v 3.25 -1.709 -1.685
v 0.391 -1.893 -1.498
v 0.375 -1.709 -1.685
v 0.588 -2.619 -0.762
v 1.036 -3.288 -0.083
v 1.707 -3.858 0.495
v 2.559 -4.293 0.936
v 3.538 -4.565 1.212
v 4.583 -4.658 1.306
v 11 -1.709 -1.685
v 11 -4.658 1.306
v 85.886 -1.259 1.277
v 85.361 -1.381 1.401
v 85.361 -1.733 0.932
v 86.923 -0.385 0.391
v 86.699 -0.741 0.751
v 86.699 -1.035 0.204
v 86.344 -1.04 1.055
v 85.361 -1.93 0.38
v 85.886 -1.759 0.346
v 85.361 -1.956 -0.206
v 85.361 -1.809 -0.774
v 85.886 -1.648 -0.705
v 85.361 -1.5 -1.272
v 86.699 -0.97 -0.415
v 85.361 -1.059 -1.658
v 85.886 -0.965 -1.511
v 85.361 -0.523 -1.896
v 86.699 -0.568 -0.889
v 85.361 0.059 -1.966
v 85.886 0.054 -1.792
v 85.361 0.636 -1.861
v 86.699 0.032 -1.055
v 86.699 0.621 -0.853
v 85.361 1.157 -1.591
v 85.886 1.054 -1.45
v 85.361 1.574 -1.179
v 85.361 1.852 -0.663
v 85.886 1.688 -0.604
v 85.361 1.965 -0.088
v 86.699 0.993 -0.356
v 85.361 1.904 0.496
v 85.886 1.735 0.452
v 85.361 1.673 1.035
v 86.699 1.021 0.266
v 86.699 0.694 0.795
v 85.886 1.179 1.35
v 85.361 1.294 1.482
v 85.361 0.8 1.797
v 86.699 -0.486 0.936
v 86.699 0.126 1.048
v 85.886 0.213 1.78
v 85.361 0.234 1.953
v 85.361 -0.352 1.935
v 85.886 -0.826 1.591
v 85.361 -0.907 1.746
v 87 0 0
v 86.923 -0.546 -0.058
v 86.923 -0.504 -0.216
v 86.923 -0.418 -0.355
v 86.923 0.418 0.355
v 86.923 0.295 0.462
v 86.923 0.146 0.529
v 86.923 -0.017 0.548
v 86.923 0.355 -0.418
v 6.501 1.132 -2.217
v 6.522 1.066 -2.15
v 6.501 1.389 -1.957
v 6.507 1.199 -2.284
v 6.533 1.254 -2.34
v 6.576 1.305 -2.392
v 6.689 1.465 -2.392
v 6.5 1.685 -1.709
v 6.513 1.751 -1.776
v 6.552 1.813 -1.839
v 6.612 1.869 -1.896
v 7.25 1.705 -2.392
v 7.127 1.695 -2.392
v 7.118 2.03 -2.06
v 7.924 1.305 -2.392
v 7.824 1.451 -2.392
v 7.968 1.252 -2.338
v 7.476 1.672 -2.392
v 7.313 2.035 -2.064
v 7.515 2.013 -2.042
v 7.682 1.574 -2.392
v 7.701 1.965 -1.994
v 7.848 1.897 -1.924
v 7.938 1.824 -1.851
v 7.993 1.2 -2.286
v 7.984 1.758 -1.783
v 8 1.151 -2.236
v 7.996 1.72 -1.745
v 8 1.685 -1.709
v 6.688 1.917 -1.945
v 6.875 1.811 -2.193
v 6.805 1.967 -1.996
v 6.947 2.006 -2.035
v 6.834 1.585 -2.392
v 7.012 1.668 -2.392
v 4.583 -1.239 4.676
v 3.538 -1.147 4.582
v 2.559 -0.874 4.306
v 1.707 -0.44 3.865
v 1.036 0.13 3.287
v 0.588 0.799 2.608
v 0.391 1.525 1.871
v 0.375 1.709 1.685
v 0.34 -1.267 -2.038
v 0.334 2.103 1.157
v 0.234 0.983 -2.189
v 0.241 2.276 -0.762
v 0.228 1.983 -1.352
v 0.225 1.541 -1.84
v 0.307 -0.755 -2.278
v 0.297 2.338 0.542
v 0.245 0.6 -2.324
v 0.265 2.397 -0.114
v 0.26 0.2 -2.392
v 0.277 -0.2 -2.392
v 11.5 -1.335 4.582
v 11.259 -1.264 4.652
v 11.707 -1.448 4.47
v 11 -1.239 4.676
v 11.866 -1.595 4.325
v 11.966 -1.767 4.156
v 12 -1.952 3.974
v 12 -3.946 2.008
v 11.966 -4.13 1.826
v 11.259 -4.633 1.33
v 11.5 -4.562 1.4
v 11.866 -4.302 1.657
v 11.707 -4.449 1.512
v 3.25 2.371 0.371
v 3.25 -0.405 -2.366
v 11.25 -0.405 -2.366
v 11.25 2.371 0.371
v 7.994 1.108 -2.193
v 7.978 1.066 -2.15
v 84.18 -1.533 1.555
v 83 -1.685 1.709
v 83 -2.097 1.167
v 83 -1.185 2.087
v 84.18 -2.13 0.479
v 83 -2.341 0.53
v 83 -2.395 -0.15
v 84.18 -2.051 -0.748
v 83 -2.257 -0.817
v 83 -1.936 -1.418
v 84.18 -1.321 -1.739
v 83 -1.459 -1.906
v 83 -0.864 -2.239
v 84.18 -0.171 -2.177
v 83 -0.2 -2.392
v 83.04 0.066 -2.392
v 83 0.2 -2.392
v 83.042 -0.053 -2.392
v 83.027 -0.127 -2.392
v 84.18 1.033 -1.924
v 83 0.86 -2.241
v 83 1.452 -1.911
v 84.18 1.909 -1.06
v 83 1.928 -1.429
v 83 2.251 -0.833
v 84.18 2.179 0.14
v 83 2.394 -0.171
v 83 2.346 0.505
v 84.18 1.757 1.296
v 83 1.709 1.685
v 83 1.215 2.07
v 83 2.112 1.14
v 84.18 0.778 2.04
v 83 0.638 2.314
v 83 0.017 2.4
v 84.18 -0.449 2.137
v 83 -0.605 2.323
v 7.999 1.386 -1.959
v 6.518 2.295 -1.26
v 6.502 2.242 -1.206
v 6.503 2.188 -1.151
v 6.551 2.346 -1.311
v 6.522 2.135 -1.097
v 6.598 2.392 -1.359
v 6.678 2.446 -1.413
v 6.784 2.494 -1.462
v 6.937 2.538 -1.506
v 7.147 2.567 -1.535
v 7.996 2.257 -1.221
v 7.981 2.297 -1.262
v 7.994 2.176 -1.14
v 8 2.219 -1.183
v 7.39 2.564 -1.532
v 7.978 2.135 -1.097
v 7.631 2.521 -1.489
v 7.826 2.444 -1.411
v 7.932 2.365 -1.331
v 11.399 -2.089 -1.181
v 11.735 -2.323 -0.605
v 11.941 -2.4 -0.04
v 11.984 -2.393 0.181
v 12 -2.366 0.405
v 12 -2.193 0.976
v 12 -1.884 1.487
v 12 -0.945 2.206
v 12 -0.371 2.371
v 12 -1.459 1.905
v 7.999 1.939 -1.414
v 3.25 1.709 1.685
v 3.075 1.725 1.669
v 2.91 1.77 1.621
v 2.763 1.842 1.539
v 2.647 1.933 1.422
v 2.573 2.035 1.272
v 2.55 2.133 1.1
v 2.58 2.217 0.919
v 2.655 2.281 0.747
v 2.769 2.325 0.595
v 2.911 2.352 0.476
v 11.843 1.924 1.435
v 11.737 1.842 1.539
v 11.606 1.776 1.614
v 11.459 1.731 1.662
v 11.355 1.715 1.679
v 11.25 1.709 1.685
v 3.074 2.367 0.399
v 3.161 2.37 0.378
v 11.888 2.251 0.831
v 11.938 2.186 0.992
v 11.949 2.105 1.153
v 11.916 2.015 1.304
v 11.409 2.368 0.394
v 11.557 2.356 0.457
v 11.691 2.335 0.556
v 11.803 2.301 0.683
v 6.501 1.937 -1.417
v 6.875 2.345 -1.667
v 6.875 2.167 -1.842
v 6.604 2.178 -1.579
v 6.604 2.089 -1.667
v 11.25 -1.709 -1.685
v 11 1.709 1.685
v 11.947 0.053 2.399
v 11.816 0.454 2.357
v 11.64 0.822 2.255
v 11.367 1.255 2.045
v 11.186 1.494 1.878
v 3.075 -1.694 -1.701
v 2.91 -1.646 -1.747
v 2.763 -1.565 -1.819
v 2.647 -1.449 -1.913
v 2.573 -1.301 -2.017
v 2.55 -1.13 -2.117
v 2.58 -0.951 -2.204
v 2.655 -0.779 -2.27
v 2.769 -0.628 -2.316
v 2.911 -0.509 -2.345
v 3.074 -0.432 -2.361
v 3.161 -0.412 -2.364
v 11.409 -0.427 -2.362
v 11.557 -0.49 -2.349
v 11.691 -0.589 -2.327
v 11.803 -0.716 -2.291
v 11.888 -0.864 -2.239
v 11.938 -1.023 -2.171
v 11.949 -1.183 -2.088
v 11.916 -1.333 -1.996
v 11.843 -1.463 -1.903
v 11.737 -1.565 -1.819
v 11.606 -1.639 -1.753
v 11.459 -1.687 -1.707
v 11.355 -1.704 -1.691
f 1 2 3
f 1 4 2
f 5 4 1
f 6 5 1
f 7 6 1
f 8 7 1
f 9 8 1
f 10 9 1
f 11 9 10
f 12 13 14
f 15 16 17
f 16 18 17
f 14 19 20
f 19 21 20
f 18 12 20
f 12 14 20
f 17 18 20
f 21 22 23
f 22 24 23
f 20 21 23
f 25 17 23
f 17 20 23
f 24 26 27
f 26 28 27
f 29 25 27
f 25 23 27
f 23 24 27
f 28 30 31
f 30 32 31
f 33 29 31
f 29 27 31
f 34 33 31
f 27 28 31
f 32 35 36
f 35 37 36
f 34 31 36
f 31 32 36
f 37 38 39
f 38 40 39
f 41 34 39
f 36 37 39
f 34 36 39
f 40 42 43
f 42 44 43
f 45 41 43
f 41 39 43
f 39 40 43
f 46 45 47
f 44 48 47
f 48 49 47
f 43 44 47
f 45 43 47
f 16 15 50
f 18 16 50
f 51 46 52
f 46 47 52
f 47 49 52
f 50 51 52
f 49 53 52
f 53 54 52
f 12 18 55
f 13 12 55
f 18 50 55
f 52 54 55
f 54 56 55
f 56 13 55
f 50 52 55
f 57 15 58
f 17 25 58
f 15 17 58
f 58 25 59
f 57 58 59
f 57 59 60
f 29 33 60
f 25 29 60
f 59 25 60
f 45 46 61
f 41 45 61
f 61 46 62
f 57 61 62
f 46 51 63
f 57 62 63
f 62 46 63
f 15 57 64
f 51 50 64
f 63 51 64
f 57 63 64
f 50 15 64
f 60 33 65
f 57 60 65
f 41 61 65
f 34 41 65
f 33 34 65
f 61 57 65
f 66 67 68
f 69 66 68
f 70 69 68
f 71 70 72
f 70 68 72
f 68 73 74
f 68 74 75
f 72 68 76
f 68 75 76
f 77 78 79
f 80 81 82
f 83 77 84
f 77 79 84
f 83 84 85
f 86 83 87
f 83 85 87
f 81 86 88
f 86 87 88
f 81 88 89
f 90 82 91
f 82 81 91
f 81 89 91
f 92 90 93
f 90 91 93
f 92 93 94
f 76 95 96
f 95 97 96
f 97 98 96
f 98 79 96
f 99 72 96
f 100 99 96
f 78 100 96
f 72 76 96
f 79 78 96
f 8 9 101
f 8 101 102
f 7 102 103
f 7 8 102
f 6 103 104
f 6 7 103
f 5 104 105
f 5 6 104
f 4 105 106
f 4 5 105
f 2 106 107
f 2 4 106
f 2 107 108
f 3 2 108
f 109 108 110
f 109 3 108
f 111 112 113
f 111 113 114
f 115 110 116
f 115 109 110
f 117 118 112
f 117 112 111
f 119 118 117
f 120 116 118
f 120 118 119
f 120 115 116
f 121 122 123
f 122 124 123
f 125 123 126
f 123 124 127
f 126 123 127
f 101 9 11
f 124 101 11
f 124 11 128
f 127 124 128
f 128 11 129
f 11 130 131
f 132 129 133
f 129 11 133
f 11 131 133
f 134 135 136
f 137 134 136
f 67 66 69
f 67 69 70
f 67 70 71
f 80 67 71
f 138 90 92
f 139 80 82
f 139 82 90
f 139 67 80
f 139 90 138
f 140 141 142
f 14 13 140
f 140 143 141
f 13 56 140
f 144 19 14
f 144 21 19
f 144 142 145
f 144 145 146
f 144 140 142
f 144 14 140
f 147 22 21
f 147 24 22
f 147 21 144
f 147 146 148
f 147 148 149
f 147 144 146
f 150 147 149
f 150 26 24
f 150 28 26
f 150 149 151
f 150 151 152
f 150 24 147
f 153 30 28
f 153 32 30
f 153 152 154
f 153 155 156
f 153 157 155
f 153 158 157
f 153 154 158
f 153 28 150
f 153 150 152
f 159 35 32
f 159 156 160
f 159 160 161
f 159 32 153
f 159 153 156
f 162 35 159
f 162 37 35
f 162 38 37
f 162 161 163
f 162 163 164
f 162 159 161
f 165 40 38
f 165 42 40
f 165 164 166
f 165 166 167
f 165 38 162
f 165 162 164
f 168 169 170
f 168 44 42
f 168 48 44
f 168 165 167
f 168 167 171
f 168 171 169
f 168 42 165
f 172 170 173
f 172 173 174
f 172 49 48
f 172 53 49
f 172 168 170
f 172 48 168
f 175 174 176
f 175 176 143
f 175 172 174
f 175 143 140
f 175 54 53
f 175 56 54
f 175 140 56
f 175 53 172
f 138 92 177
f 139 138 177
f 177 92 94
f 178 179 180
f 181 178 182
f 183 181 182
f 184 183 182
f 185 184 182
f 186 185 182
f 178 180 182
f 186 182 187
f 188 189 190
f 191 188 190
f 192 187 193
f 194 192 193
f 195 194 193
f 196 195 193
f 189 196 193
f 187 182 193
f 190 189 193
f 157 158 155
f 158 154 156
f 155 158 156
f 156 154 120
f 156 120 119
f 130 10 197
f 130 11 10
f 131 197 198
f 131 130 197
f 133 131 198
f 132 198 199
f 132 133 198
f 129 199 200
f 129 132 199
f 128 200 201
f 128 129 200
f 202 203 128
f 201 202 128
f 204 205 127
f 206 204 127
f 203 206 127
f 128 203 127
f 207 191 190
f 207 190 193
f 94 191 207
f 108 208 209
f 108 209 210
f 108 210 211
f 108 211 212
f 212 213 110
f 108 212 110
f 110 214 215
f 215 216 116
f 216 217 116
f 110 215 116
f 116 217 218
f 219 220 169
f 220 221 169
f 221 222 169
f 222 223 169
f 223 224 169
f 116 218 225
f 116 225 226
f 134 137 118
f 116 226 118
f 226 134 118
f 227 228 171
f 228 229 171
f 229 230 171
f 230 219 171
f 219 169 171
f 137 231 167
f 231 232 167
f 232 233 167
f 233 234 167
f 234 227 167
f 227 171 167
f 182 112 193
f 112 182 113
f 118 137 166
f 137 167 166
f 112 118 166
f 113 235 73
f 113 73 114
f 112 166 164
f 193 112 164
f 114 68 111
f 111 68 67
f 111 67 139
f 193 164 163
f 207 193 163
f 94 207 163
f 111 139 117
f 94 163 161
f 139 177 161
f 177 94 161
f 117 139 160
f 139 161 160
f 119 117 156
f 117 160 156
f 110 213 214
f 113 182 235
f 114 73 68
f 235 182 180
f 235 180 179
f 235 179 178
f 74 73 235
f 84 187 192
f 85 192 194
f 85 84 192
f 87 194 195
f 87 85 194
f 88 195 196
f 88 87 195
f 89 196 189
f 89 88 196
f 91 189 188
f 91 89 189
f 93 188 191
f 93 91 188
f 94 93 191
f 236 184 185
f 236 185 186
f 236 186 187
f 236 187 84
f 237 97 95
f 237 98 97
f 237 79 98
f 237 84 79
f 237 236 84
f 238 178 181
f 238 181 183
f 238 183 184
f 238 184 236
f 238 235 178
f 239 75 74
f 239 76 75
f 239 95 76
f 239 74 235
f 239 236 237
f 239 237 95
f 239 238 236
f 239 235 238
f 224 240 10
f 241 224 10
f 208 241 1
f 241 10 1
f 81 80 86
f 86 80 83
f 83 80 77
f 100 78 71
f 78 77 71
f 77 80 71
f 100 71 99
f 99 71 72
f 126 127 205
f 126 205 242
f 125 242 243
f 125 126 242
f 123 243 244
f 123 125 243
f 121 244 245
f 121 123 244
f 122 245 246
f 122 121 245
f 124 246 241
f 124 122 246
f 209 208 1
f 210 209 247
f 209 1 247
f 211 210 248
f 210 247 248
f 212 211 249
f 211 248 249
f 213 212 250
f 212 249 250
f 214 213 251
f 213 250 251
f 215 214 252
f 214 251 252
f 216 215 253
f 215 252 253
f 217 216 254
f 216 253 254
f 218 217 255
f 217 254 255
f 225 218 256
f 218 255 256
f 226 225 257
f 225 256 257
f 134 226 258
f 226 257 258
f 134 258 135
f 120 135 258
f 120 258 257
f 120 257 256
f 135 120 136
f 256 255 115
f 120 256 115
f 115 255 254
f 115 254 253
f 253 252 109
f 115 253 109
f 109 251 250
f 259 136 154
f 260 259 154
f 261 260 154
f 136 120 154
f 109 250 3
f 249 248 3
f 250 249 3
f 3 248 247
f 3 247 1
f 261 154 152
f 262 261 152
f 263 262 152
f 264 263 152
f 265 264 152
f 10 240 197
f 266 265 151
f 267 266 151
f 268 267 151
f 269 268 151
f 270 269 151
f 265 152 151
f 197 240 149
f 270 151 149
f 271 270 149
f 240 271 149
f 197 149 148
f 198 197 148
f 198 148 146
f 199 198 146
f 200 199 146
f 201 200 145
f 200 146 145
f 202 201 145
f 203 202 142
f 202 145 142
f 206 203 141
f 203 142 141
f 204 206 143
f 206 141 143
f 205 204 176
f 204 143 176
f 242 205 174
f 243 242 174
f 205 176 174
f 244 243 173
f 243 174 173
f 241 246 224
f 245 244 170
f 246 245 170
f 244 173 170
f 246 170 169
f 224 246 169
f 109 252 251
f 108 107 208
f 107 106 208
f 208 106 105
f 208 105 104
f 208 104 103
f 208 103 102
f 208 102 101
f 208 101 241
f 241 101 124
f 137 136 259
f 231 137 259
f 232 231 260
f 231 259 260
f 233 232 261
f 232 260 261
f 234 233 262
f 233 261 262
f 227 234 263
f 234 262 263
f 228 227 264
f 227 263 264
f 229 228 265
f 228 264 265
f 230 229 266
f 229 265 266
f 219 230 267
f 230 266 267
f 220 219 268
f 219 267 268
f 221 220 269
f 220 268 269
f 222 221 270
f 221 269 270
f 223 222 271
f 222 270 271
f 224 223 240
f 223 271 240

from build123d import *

# Parameters (mm, degrees)
SKETCH_R             = 2.4
PAD_DEPTH            = 87
SKETCH002_W          = 12
SKETCH002_H          = 5
PAD001_DEPTH         = 2.4
PAD001_DEPTH_BACK    = 2.4
POCKET_DEPTH         = 5
POCKET001_DEPTH      = 5
SKETCH005_R          = 2.4
PAD002_DEPTH         = 6
PAD003_DEPTH         = 0.75
PAD003_DEPTH_BACK    = 0.75
POCKET002_DEPTH      = 5
POCKET003_DEPTH      = 5
POCKET004_DEPTH      = 10
POCKET005_DEPTH      = 100
POCKET005_DEPTH_BACK = -100
BODY_PLACEMENT_ANGLE = 44.59


with BuildPart() as part:
    # Sketch → Pad (new body)
    with BuildSketch(Plane.YZ):
        Circle(SKETCH_R)
    extrude(amount=PAD_DEPTH)

    # Sketch001 → Groove (revolve, cut)
    with BuildSketch(Plane.XZ):
        with BuildLine():
            Line((87, 2.4), (83, 2.4))
            Line((83, 2.4), (85.360656, 1.967213))
            ThreePointArc((87, 0), (86.536443, 1.280369), (85.360656, 1.967213))
            Line((88, 0), (87, 0))
            Line((88, 2.4), (88, 0))
            Line((87, 2.4), (88, 2.4))
        make_face()
    revolve(axis=Axis((0, 0, 0), (1, 0, 0)), mode=Mode.SUBTRACT)

    # Sketch002 → Pad001 (join, two sides)
    with BuildSketch(Plane.XZ) as pad001_sk:
        with Locations((6, 2.5)):
            Rectangle(SKETCH002_W, SKETCH002_H)
    extrude(amount=PAD001_DEPTH)
    extrude(pad001_sk.sketch, amount=-PAD001_DEPTH_BACK)

    # Sketch003 (on Face5 of Pad001) → Pocket (cut)
    with BuildSketch(Plane(origin=(0, -2.4, 0), x_dir=(0, 0, -1), z_dir=(0, -1, 0))):
        with BuildLine():
            Line((-5, 0), (-5, 3))
            ThreePointArc((-5, 3), (-3.908916, 1.259301), (-2, 0.5))
            Line((-2, 0.5), (6, 0))
            Line((-2, 0), (6, 0))
            Line((-2, 0), (-5, 0))
        make_face()
    extrude(amount=-POCKET_DEPTH, mode=Mode.SUBTRACT)

    # Sketch004 (on Face7 of Pocket) → Pocket001 (cut)
    with BuildSketch(Plane(origin=(0, 0, 5), x_dir=(0, -1, 0), z_dir=(0, 0, 1))):
        with BuildLine():
            ThreePointArc((-1.4, 12), (-2.107107, 11.707107), (-2.4, 11))
            Line((-2.4, 11), (-2.4, 12))
            Line((-2.4, 12), (-1.4, 12))
        make_face()
        with BuildLine():
            ThreePointArc((2.4, 11), (2.107107, 11.707107), (1.4, 12))
            Line((2.4, 12), (1.4, 12))
            Line((2.4, 12), (2.4, 11))
        make_face()
    extrude(amount=-POCKET001_DEPTH, mode=Mode.SUBTRACT)

    # Sketch005 (on Face10 of Pocket001) → Pad002 (join)
    with BuildSketch(Plane(origin=(12, 0, 0), x_dir=(0, 1, 0), z_dir=(-1, 0, 0))):
        Circle(SKETCH005_R)
    extrude(amount=PAD002_DEPTH)

    # Sketch006 → Pad003 (join, two sides)
    with BuildSketch(Plane.XZ) as pad003_sk:
        with BuildLine():
            add(Edge.make_bspline(
                [(8, -2.4), (8, -1.533975), (6.875, -1.966987), (5.75, -2.4), (6.875, -2.833013), (8, -3.266025), (8, -2.4)],
                knots=[0, 0, 0, 2.094395, 2.094395, 4.18879, 4.18879, 6.283185, 6.283185, 6.283185], degree=2, weights=[1, 0.5, 1, 0.5, 1, 0.5, 1]))
        make_face()
    extrude(amount=PAD003_DEPTH)
    extrude(pad003_sk.sketch, amount=-PAD003_DEPTH_BACK)

    # Sketch007 (on Face8 of Pad003) → Pocket002 (cut)
    with BuildSketch(Plane(origin=(0, -2.4, 0), x_dir=(0, 0, -1), z_dir=(0, -1, 0))):
        with BuildLine():
            ThreePointArc((-4.2, 3.455854), (-3.386482, 1.401761), (-1.387135, 0.461696))
            Line((-5, 0.461696), (-1.387135, 0.461696))
            Line((-5, 12), (-5, 0.461696))
            Line((-4.2, 12), (-5, 12))
            Line((-4.2, 3.455854), (-4.2, 12))
        make_face()
    extrude(amount=-POCKET002_DEPTH, mode=Mode.SUBTRACT)

    # Sketch008 (on Face8 of Pocket002) → Pocket003 (cut)
    with BuildSketch(Plane(origin=(0, -2.4, 0), x_dir=(0, 0, -1), z_dir=(0, -1, 0))):
        with BuildLine():
            ThreePointArc((-4.2, 4.583194), (-3.061073, 1.707464), (-0.261987, 0.391374))
            Line((-0.261987, 0.391374), (-4.2, 0.6375))
            Line((-4.2, 4.583194), (-4.2, 0.6375))
        make_face()
    extrude(amount=-POCKET003_DEPTH, mode=Mode.SUBTRACT)

    # Sketch009 (on Face8 of Pocket003) → Pocket004 (cut)
    with BuildSketch(Plane(origin=(0, -2.4, 0), x_dir=(0, 0, -1), z_dir=(0, -1, 0))):
        with BuildLine():
            ThreePointArc((0, 3.25), (0.7, 2.55), (1.4, 3.25))
            Line((1.4, 3.25), (1.4, 11.25))
            ThreePointArc((1.4, 11.25), (0.7, 11.95), (0, 11.25))
            Line((0, 11.25), (0, 3.25))
        make_face()
    extrude(amount=-POCKET004_DEPTH, mode=Mode.SUBTRACT)

    # Sketch010 → Pocket005 (cut, two sides)
    with BuildSketch(Plane.YZ) as pocket005_sk:
        Polygon((-1.821564, -1.56266), (-0.465163, -2.9), (-1.821564, -2.9), align=None)
    extrude(amount=-POCKET005_DEPTH, mode=Mode.SUBTRACT)
    extrude(pocket005_sk.sketch, amount=-POCKET005_DEPTH_BACK, mode=Mode.SUBTRACT)


with BuildPart() as part_1:
    # Body placement: moved
    add(part.part.rotate(Axis((0, 0, 0), (1, 0, 0)), BODY_PLACEMENT_ANGLE))


solid = part_1.part
